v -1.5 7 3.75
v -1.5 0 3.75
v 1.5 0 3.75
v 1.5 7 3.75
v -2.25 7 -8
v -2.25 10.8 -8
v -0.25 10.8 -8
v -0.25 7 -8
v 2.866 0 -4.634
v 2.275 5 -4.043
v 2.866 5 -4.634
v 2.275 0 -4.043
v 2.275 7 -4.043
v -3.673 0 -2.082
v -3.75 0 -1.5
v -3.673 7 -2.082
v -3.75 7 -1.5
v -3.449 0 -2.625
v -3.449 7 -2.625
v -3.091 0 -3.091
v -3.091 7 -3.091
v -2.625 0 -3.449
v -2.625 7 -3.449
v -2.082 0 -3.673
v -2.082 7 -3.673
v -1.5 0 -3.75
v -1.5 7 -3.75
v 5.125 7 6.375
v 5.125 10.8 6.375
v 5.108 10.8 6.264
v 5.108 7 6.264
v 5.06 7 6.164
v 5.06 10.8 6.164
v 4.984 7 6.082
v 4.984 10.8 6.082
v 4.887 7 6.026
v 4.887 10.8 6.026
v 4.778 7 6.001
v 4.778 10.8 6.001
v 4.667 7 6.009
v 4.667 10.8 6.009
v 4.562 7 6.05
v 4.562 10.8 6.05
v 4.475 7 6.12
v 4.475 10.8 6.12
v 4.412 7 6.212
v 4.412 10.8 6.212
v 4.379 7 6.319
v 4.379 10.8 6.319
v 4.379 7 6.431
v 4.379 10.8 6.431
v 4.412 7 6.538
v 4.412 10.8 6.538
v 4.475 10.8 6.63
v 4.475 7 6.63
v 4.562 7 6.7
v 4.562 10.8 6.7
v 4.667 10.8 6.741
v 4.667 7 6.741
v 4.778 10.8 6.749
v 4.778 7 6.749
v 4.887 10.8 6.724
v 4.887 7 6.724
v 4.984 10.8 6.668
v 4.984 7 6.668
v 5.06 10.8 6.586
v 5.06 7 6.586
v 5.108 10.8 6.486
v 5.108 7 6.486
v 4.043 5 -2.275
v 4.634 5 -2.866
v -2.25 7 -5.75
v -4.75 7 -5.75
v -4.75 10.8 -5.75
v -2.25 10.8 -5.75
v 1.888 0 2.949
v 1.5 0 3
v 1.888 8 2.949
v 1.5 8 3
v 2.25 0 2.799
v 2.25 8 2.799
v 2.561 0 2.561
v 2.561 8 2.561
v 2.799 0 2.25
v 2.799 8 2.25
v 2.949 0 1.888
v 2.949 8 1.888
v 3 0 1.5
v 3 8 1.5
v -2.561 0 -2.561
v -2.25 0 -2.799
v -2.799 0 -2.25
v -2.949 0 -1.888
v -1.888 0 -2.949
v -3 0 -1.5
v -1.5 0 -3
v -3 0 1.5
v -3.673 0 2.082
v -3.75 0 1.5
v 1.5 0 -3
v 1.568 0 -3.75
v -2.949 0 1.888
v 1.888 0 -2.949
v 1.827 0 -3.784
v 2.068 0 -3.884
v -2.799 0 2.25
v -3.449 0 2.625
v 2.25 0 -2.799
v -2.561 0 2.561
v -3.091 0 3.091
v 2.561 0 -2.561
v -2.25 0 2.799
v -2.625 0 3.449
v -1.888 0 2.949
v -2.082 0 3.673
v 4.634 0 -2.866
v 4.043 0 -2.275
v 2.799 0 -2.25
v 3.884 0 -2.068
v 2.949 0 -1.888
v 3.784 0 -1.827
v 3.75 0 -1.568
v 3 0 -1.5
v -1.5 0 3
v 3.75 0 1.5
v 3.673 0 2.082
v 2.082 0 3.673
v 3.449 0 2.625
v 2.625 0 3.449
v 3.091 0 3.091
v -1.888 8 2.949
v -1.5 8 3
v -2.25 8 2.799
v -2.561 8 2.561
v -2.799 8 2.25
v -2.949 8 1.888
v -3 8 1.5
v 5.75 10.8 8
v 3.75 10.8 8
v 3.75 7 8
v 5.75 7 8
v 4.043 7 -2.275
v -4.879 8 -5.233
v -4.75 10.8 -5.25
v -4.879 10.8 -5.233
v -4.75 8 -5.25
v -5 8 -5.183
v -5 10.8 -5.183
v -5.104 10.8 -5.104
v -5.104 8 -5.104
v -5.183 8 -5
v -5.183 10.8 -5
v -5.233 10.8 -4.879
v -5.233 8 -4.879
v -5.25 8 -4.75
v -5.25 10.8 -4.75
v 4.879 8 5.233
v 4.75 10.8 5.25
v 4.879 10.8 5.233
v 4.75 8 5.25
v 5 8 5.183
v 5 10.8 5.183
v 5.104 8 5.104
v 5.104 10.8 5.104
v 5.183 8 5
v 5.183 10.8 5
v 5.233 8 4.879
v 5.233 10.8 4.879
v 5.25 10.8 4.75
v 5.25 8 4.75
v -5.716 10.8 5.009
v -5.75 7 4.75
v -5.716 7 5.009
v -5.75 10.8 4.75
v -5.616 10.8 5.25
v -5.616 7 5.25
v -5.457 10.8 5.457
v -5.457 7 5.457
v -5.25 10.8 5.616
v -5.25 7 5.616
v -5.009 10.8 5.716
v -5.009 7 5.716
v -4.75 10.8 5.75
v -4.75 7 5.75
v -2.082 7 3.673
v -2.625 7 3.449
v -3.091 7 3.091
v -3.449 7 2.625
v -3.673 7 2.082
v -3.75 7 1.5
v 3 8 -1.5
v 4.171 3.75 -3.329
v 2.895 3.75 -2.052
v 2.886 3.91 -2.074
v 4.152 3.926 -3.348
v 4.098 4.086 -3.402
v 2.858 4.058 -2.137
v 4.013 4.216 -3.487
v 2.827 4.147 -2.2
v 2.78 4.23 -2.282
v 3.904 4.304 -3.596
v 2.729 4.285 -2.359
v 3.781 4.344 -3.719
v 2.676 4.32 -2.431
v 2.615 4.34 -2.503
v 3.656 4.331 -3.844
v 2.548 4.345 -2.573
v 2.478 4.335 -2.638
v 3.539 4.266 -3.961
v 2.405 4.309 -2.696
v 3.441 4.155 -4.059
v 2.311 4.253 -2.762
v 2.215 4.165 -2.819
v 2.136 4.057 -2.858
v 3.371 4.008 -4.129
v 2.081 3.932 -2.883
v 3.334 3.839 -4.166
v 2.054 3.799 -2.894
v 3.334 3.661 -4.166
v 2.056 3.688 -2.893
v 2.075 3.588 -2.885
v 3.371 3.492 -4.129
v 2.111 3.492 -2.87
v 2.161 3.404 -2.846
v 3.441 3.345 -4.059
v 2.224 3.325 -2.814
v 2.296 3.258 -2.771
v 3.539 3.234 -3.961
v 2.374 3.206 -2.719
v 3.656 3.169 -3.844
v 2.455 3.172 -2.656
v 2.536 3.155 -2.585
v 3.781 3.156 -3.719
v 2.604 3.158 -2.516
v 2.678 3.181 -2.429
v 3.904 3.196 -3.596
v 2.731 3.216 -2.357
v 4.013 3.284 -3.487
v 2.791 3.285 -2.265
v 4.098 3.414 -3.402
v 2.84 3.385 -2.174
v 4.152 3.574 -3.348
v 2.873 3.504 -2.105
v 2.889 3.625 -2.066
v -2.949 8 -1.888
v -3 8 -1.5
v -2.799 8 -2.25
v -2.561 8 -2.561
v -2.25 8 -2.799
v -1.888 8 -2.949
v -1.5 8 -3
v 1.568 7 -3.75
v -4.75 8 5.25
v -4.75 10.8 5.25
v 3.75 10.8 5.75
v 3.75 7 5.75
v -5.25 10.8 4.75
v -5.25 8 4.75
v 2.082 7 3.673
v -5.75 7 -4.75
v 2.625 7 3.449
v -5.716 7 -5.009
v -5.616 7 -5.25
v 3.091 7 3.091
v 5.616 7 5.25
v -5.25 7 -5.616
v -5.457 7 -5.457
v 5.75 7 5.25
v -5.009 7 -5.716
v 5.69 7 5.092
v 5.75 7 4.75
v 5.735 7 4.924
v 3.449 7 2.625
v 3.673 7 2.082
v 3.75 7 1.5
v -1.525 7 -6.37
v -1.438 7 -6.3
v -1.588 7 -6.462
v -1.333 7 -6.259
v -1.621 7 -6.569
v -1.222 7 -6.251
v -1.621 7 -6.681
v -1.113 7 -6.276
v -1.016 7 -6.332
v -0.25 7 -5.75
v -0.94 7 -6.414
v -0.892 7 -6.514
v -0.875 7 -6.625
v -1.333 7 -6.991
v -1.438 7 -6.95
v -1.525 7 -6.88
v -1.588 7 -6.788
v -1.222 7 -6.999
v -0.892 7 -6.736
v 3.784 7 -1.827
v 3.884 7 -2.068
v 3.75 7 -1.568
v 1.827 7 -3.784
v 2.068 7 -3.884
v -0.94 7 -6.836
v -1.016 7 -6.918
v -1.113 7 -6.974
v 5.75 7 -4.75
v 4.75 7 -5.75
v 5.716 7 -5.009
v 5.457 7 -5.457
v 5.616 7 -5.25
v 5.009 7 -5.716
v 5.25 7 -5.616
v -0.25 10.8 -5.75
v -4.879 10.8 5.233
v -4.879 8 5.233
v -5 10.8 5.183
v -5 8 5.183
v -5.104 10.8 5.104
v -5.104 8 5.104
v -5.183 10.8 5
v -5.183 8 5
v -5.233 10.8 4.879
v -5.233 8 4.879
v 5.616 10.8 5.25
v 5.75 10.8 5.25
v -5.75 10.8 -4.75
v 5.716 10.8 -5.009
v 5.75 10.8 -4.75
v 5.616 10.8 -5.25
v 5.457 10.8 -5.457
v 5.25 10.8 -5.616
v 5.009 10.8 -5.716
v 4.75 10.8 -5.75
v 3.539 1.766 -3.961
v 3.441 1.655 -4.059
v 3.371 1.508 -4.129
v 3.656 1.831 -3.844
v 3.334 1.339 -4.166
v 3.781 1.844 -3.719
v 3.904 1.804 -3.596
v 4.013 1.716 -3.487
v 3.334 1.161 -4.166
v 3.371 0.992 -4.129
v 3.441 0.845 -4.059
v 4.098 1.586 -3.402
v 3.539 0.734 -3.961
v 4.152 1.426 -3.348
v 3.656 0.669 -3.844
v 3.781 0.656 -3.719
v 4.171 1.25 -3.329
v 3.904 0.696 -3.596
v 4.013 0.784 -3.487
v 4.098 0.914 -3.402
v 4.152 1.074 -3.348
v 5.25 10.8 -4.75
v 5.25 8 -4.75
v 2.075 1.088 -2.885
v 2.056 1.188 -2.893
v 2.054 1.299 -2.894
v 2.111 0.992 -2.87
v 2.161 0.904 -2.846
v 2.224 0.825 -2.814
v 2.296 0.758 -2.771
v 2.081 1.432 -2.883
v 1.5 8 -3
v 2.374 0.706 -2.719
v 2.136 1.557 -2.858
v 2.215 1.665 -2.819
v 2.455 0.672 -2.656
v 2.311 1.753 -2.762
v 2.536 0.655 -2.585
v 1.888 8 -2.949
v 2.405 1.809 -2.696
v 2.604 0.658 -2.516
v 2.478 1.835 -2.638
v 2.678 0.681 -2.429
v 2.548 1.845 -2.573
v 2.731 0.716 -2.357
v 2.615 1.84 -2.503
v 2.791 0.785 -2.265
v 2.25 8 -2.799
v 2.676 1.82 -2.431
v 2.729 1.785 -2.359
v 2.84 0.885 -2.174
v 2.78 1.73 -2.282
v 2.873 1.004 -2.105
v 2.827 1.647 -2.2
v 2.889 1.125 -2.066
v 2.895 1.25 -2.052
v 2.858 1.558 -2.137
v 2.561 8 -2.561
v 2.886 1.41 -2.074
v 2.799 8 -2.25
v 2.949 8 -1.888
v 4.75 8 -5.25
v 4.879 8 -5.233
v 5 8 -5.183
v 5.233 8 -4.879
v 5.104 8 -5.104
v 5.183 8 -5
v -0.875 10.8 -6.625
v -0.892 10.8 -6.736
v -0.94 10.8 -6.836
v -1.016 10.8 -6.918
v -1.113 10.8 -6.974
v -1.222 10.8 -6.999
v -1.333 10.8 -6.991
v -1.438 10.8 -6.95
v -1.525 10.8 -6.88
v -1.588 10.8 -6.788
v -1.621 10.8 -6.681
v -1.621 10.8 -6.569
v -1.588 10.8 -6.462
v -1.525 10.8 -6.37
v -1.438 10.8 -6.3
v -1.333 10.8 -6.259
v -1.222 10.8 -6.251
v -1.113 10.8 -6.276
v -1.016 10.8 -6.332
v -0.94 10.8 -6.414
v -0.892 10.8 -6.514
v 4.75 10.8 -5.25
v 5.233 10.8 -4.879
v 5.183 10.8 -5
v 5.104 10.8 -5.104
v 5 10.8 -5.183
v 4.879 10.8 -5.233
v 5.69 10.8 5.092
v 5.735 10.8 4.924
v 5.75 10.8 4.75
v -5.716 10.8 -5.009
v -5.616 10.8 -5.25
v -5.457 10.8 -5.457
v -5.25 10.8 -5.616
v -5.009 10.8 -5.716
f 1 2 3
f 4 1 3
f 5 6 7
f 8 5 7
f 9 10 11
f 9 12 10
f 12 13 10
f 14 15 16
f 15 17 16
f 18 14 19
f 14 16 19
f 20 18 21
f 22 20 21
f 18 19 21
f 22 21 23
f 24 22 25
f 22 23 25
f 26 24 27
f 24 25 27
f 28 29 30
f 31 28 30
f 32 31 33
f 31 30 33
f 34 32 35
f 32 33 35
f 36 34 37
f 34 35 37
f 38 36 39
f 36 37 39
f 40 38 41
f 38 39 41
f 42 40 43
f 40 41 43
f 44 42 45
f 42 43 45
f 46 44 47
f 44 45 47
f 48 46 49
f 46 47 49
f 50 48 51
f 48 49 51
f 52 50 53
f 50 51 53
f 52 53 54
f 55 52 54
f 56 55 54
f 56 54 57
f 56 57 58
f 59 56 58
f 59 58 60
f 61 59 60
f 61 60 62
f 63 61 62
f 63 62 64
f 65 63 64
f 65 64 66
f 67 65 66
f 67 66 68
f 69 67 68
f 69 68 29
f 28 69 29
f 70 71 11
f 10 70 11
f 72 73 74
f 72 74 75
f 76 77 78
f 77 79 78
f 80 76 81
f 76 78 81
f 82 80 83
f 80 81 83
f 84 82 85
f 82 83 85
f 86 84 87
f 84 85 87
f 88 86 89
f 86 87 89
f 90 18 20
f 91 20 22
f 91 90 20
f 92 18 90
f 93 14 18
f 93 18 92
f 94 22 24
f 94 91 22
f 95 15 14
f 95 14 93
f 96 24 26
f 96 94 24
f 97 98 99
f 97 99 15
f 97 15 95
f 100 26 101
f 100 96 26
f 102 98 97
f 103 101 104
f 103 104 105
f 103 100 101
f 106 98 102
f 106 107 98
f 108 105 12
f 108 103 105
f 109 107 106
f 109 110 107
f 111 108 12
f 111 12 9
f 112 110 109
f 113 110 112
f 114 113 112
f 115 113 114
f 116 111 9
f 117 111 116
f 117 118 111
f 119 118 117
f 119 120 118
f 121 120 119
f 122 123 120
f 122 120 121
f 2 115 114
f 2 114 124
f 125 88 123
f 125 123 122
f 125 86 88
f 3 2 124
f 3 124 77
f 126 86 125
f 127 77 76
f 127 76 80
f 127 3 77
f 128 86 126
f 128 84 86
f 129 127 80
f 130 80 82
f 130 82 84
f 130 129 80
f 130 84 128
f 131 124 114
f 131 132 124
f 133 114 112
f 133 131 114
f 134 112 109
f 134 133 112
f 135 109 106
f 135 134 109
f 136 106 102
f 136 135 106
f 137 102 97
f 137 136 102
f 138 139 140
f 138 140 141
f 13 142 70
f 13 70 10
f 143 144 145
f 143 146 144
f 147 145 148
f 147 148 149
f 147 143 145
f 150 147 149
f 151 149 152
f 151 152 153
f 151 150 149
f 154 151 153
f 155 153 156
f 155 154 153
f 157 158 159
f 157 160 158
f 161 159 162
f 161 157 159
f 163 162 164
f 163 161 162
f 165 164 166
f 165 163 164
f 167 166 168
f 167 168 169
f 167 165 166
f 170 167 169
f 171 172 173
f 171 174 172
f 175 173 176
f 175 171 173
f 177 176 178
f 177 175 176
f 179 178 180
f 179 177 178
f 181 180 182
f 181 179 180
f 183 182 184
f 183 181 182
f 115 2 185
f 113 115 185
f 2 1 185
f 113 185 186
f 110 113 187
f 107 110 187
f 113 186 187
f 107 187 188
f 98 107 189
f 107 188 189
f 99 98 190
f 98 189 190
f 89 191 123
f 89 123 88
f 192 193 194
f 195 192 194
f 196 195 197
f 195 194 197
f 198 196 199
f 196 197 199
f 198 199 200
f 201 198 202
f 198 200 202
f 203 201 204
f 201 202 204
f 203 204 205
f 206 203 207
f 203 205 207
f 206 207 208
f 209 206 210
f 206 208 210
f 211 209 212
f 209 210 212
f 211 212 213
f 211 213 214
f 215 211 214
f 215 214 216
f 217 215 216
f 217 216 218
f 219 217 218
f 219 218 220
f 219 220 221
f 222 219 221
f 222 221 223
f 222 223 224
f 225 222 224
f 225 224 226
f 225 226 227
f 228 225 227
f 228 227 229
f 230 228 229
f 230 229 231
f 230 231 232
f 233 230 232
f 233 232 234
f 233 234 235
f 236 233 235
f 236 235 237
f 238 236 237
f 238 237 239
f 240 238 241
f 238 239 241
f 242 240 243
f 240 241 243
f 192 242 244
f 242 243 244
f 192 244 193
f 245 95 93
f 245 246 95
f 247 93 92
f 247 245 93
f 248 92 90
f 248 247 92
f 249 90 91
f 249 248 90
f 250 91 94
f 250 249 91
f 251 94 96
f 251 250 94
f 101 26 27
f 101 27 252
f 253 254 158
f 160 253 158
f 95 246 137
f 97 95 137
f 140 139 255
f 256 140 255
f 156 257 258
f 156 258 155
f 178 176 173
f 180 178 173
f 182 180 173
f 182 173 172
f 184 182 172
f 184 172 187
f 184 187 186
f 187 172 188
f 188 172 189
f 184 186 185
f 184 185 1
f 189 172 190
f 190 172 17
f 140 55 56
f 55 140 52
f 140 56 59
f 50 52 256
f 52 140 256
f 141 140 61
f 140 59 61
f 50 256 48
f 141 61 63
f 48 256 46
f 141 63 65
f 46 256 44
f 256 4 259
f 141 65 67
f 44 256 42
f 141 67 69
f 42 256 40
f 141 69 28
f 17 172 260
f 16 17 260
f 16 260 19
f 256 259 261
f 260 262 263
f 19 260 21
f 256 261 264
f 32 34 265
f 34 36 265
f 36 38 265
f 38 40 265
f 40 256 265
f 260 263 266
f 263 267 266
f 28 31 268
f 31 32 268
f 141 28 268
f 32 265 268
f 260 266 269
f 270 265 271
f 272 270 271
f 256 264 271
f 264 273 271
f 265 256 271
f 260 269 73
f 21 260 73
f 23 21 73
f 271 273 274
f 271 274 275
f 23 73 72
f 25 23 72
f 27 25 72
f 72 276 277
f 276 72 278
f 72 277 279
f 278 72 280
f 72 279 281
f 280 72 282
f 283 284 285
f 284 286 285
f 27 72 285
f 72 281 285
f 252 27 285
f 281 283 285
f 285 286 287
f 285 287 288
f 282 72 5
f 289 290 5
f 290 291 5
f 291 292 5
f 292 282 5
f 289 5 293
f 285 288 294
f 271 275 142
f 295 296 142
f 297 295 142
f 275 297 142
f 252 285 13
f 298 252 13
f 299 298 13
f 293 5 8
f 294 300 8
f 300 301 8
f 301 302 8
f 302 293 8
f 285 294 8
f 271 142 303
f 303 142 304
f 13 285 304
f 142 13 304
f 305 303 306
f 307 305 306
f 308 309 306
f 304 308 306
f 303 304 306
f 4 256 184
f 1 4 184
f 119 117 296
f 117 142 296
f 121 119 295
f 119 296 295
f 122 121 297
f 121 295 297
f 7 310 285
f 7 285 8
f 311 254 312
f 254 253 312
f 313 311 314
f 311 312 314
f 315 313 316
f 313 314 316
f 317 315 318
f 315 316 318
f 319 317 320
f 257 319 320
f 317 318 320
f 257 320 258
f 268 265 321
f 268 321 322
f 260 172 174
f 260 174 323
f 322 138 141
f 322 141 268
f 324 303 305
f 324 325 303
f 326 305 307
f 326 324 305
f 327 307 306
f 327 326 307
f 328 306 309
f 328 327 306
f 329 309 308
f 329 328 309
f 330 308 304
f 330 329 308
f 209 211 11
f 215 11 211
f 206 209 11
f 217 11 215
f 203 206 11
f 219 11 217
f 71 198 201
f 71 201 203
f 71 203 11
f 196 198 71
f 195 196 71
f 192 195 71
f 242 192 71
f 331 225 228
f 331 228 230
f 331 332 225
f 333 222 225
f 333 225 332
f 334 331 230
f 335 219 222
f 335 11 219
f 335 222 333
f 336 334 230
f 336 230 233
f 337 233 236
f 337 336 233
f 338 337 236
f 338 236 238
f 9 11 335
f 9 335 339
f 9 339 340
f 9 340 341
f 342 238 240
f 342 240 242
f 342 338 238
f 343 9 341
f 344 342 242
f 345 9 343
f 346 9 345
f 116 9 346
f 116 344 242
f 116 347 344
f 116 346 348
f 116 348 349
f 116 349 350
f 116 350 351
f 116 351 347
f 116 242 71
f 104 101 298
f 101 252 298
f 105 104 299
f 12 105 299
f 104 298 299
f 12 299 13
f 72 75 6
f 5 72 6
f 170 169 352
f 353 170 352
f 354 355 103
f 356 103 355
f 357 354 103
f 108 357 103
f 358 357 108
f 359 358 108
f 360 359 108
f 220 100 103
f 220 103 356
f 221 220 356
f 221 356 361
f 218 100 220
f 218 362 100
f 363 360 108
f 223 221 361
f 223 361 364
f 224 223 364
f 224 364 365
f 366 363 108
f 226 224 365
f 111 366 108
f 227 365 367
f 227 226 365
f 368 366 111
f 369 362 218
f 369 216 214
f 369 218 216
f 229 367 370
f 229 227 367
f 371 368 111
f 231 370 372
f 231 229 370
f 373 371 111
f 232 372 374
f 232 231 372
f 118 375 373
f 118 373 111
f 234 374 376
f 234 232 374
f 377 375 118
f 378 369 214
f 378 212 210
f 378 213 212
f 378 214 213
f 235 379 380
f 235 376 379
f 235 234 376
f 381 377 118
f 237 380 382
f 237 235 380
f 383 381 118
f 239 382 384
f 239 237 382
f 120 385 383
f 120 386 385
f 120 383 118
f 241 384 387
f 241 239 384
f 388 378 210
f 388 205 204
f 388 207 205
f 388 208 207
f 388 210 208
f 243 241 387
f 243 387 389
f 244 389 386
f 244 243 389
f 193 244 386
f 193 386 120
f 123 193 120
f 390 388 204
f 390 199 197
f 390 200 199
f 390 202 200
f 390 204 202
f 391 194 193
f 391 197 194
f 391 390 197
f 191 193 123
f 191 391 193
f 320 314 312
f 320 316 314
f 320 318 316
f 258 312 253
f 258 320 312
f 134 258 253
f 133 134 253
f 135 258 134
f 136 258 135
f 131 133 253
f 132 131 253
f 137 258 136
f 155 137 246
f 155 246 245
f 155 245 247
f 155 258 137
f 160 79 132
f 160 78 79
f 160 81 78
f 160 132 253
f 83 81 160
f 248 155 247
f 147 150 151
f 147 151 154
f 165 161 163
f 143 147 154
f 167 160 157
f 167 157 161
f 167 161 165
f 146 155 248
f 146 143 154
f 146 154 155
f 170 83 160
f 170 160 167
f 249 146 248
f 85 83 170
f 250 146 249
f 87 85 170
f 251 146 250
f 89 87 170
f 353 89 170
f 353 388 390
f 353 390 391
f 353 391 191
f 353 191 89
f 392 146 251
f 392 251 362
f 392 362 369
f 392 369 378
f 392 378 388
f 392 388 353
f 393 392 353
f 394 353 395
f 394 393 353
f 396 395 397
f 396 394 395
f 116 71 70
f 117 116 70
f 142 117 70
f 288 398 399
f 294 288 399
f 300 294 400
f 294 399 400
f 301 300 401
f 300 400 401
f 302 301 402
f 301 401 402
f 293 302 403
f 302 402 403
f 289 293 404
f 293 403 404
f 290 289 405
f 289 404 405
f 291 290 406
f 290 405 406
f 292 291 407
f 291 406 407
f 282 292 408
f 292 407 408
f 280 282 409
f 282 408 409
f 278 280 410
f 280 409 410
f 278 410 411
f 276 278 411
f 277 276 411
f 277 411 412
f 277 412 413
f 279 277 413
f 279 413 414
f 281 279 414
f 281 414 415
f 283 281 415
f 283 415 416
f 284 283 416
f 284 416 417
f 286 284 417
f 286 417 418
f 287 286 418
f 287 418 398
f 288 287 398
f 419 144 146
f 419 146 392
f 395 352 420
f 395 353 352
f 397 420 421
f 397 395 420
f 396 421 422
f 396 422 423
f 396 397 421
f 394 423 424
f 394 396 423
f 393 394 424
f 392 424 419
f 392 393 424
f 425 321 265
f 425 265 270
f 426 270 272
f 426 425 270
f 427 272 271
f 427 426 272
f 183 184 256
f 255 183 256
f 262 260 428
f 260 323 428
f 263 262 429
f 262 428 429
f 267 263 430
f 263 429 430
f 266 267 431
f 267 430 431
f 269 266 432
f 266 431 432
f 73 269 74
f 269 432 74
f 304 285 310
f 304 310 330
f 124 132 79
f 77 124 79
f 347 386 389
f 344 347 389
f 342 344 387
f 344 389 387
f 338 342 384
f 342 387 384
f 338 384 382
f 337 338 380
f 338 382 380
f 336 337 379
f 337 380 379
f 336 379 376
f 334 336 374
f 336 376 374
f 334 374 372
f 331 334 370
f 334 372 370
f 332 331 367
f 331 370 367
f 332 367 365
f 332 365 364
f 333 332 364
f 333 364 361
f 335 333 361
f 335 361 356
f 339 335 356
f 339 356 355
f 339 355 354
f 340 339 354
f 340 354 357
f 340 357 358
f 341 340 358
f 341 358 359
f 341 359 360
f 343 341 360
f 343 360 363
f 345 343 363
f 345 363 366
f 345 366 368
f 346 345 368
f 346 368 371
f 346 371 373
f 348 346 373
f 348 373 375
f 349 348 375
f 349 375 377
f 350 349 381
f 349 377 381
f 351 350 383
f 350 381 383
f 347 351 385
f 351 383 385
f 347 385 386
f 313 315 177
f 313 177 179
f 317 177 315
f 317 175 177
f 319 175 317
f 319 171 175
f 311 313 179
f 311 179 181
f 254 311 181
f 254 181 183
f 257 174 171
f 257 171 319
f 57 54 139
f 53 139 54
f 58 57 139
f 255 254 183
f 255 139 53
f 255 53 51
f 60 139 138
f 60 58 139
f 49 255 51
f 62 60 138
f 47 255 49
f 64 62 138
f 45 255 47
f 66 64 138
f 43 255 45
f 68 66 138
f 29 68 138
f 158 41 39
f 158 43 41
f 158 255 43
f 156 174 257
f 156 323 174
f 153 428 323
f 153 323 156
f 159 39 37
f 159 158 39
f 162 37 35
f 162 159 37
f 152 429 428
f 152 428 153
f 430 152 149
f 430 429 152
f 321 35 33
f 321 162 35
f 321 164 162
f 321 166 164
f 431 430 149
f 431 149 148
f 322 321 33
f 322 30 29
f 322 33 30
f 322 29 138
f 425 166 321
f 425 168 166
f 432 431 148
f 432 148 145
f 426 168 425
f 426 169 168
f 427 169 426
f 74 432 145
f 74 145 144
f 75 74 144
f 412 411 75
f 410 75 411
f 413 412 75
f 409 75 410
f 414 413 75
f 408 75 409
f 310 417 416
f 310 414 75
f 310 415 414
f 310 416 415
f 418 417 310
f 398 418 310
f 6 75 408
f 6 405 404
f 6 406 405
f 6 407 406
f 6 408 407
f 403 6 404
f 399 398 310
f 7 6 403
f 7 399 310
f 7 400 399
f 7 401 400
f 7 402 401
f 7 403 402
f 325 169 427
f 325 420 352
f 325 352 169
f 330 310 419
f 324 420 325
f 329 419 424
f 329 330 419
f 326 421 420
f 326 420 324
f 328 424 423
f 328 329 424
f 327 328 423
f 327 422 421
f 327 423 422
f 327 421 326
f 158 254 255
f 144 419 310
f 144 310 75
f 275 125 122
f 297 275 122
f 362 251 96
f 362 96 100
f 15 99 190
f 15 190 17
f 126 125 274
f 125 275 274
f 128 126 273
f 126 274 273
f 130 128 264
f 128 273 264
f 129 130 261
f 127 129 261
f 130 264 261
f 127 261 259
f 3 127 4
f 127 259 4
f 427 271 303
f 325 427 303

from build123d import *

# Parameters (mm, degrees)
SKETCH1_W                     = 7.5
SKETCH1_H                     = 7.5
BOSS_EXTRUDE1_DEPTH           = 7
SKETCH2_W                     = 11.5
SKETCH2_H                     = 11.5
BOSS_EXTRUDE2_DEPTH           = 3.8
SKETCH3_W                     = 6
SKETCH3_H                     = 6
CUT_EXTRUDE1_DEPTH            = 11.8
SKETCH6_W                     = 10.5
SKETCH6_H                     = 10.5
CUT_EXTRUDE3_DEPTH            = 2.8
FILLET1_R                     = 0.5
BOSS_EXTRUDE3_REACH           = 12.8
FILLET4_R                     = 1.5
FILLET2_R                     = 1
TAP_DRILL_FOR_0_80_TAP1_D     = 1.19126
TAP_DRILL_FOR_0_80_TAP1_DEPTH = 7.11
TAP_DRILL_FOR_0_80_TAP1_TIP   = 0.357890611
FILLET5_R                     = 2.25
SKETCH16_W                    = 2.5
SKETCH16_H                    = 2
CUT_EXTRUDE4_DEPTH            = 0.835786
FILLET6_R                     = 1
SKETCH17_W                    = 2
SKETCH17_H                    = 2.25
SKETCH17_H_2                  = 2.75
BOSS_EXTRUDE4_DEPTH           = 3.8
SKETCH18_R                    = 0.375
CUT_EXTRUDE5_DEPTH            = 11.8000001


with BuildPart() as part:
    # Sketch1 → Boss-Extrude1 (new body)
    with BuildSketch(Plane(origin=(0, 0, 0), x_dir=(1, 0, 0), z_dir=(0, 1, 0))):
        Rectangle(SKETCH1_W, SKETCH1_H)
    extrude(amount=BOSS_EXTRUDE1_DEPTH)

    # Sketch2 → Boss-Extrude2 (add)
    with BuildSketch(Plane(origin=(0, 7, 0), x_dir=(1, 0, 0), z_dir=(0, 1, 0))):
        Rectangle(SKETCH2_W, SKETCH2_H)
    extrude(amount=BOSS_EXTRUDE2_DEPTH)

    # Sketch3 → Cut-Extrude1 (cut, through all)
    with BuildSketch(Plane.XZ):
        Rectangle(SKETCH3_W, SKETCH3_H)
    extrude(amount=-CUT_EXTRUDE1_DEPTH, mode=Mode.SUBTRACT)

    # Sketch6 → Cut-Extrude3 (cut)
    with BuildSketch(Plane(origin=(0, 10.8, 0), x_dir=(1, 0, 0), z_dir=(0, 1, 0))):
        Rectangle(SKETCH6_W, SKETCH6_H)
    extrude(amount=-CUT_EXTRUDE3_DEPTH, mode=Mode.SUBTRACT)

    # Fillet1
    fillet1_edges = [part.edges().sort_by_distance(p)[0] for p in [
        (5.25, 9.4, 5.25),
        (5.25, 9.4, -5.25),
        (-5.25, 9.4, -5.25),
        (-5.25, 9.4, 5.25),
    ]]
    fillet(fillet1_edges, radius=FILLET1_R)

    # Sketch12 → Boss-Extrude3 (add, up to next)
    with BuildSketch(Plane.XZ, mode=Mode.PRIVATE) as boss_extrude3_sk1:
        Polygon((3.75, -3.75), (4.633883476, -2.866116524), (3.75, -1.982233047), align=None)
    boss_extrude3_tool1 = extrude(boss_extrude3_sk1.sketch, amount=-BOSS_EXTRUDE3_REACH, mode=Mode.PRIVATE) - part.part
    add(boss_extrude3_tool1.solids().sort_by_distance((4.044628, 0, -2.866117))[0])
    # Sketch12 → Boss-Extrude3 (add, up to next)
    with BuildSketch(Plane.XZ, mode=Mode.PRIVATE) as boss_extrude3_sk2:
        Polygon((2.866116524, -4.633883476), (3.75, -3.75), (1.982233047, -3.75), align=None)
    boss_extrude3_tool2 = extrude(boss_extrude3_sk2.sketch, amount=-BOSS_EXTRUDE3_REACH, mode=Mode.PRIVATE) - part.part
    add(boss_extrude3_tool2.solids().sort_by_distance((2.866117, 0, -4.044628))[0])

    # Fillet4
    fillet4_edges = [part.edges().sort_by_distance(p)[0] for p in [
        (-3, 4, 3),
        (3, 4, 3),
        (-3, 4, -3),
        (3, 4, -3),
    ]]
    fillet(fillet4_edges, radius=FILLET4_R)

    # Fillet2
    fillet2_edges = [part.edges().sort_by_distance(p)[0] for p in [
        (3.75, 3.5, -1.982233047),
        (1.982233047, 3.5, -3.75),
    ]]
    fillet(fillet2_edges, radius=FILLET2_R)

    # Tap Drill for #0-80 Tap1
    with Locations(Plane(origin=(3.75, 0, -3.75), x_dir=(-0.707106781, 0, -0.707106781), z_dir=(0.707106781, 0, -0.707106781))):
        with Locations((0, 1.25), (0, 3.75)):
            Hole(TAP_DRILL_FOR_0_80_TAP1_D / 2, depth=TAP_DRILL_FOR_0_80_TAP1_DEPTH)
            with Locations((0, 0, -(TAP_DRILL_FOR_0_80_TAP1_DEPTH + TAP_DRILL_FOR_0_80_TAP1_TIP / 2))):  # 118° drill point
                Cone(0, TAP_DRILL_FOR_0_80_TAP1_D / 2, TAP_DRILL_FOR_0_80_TAP1_TIP, mode=Mode.SUBTRACT)

    # Fillet5
    fillet5_edges = [part.edges().sort_by_distance(p)[0] for p in [
        (3.75, 3.5, 3.75),
        (-3.75, 3.5, 3.75),
        (-3.75, 3.5, -3.75),
    ]]
    fillet(fillet5_edges, radius=FILLET5_R)

    # Sketch16 → Cut-Extrude4 (cut)
    with BuildSketch(Plane(origin=(3.75, 0, -3.75), x_dir=(-0.707106781, 0, -0.707106781), z_dir=(0.707106781, 0, -0.707106781))):
        with Locations((0, 6)):
            Rectangle(SKETCH16_W, SKETCH16_H)
    extrude(amount=-CUT_EXTRUDE4_DEPTH, mode=Mode.SUBTRACT)

    # Fillet6
    fillet6_edges = [part.edges().sort_by_distance(p)[0] for p in [
        (-5.75, 8.9, -5.75),
        (-5.75, 8.9, 5.75),
        (5.75, 8.9, 5.75),
        (5.75, 8.9, -5.75),
    ]]
    fillet(fillet6_edges, radius=FILLET6_R)

    # Sketch17 → Boss-Extrude4 (add)
    with BuildSketch(Plane(origin=(0, 10.8, 0), x_dir=(1, 0, 0), z_dir=(0, 1, 0))):
        with Locations((-1.25, 6.875)):
            Rectangle(SKETCH17_W, SKETCH17_H)
        with Locations((4.75, -6.625)):
            Rectangle(SKETCH17_W, SKETCH17_H_2)
    extrude(amount=-BOSS_EXTRUDE4_DEPTH)

    # Sketch18 → Cut-Extrude5 (cut, through all)
    with BuildSketch(Plane(origin=(0, 10.8, 0), x_dir=(1, 0, 0), z_dir=(0, 1, 0))):
        with Locations((4.75, -6.375)):
            Circle(SKETCH18_R)
        with Locations((-1.25, 6.625)):
            Circle(SKETCH18_R)
    extrude(amount=-CUT_EXTRUDE5_DEPTH, mode=Mode.SUBTRACT)


solid = part.part
